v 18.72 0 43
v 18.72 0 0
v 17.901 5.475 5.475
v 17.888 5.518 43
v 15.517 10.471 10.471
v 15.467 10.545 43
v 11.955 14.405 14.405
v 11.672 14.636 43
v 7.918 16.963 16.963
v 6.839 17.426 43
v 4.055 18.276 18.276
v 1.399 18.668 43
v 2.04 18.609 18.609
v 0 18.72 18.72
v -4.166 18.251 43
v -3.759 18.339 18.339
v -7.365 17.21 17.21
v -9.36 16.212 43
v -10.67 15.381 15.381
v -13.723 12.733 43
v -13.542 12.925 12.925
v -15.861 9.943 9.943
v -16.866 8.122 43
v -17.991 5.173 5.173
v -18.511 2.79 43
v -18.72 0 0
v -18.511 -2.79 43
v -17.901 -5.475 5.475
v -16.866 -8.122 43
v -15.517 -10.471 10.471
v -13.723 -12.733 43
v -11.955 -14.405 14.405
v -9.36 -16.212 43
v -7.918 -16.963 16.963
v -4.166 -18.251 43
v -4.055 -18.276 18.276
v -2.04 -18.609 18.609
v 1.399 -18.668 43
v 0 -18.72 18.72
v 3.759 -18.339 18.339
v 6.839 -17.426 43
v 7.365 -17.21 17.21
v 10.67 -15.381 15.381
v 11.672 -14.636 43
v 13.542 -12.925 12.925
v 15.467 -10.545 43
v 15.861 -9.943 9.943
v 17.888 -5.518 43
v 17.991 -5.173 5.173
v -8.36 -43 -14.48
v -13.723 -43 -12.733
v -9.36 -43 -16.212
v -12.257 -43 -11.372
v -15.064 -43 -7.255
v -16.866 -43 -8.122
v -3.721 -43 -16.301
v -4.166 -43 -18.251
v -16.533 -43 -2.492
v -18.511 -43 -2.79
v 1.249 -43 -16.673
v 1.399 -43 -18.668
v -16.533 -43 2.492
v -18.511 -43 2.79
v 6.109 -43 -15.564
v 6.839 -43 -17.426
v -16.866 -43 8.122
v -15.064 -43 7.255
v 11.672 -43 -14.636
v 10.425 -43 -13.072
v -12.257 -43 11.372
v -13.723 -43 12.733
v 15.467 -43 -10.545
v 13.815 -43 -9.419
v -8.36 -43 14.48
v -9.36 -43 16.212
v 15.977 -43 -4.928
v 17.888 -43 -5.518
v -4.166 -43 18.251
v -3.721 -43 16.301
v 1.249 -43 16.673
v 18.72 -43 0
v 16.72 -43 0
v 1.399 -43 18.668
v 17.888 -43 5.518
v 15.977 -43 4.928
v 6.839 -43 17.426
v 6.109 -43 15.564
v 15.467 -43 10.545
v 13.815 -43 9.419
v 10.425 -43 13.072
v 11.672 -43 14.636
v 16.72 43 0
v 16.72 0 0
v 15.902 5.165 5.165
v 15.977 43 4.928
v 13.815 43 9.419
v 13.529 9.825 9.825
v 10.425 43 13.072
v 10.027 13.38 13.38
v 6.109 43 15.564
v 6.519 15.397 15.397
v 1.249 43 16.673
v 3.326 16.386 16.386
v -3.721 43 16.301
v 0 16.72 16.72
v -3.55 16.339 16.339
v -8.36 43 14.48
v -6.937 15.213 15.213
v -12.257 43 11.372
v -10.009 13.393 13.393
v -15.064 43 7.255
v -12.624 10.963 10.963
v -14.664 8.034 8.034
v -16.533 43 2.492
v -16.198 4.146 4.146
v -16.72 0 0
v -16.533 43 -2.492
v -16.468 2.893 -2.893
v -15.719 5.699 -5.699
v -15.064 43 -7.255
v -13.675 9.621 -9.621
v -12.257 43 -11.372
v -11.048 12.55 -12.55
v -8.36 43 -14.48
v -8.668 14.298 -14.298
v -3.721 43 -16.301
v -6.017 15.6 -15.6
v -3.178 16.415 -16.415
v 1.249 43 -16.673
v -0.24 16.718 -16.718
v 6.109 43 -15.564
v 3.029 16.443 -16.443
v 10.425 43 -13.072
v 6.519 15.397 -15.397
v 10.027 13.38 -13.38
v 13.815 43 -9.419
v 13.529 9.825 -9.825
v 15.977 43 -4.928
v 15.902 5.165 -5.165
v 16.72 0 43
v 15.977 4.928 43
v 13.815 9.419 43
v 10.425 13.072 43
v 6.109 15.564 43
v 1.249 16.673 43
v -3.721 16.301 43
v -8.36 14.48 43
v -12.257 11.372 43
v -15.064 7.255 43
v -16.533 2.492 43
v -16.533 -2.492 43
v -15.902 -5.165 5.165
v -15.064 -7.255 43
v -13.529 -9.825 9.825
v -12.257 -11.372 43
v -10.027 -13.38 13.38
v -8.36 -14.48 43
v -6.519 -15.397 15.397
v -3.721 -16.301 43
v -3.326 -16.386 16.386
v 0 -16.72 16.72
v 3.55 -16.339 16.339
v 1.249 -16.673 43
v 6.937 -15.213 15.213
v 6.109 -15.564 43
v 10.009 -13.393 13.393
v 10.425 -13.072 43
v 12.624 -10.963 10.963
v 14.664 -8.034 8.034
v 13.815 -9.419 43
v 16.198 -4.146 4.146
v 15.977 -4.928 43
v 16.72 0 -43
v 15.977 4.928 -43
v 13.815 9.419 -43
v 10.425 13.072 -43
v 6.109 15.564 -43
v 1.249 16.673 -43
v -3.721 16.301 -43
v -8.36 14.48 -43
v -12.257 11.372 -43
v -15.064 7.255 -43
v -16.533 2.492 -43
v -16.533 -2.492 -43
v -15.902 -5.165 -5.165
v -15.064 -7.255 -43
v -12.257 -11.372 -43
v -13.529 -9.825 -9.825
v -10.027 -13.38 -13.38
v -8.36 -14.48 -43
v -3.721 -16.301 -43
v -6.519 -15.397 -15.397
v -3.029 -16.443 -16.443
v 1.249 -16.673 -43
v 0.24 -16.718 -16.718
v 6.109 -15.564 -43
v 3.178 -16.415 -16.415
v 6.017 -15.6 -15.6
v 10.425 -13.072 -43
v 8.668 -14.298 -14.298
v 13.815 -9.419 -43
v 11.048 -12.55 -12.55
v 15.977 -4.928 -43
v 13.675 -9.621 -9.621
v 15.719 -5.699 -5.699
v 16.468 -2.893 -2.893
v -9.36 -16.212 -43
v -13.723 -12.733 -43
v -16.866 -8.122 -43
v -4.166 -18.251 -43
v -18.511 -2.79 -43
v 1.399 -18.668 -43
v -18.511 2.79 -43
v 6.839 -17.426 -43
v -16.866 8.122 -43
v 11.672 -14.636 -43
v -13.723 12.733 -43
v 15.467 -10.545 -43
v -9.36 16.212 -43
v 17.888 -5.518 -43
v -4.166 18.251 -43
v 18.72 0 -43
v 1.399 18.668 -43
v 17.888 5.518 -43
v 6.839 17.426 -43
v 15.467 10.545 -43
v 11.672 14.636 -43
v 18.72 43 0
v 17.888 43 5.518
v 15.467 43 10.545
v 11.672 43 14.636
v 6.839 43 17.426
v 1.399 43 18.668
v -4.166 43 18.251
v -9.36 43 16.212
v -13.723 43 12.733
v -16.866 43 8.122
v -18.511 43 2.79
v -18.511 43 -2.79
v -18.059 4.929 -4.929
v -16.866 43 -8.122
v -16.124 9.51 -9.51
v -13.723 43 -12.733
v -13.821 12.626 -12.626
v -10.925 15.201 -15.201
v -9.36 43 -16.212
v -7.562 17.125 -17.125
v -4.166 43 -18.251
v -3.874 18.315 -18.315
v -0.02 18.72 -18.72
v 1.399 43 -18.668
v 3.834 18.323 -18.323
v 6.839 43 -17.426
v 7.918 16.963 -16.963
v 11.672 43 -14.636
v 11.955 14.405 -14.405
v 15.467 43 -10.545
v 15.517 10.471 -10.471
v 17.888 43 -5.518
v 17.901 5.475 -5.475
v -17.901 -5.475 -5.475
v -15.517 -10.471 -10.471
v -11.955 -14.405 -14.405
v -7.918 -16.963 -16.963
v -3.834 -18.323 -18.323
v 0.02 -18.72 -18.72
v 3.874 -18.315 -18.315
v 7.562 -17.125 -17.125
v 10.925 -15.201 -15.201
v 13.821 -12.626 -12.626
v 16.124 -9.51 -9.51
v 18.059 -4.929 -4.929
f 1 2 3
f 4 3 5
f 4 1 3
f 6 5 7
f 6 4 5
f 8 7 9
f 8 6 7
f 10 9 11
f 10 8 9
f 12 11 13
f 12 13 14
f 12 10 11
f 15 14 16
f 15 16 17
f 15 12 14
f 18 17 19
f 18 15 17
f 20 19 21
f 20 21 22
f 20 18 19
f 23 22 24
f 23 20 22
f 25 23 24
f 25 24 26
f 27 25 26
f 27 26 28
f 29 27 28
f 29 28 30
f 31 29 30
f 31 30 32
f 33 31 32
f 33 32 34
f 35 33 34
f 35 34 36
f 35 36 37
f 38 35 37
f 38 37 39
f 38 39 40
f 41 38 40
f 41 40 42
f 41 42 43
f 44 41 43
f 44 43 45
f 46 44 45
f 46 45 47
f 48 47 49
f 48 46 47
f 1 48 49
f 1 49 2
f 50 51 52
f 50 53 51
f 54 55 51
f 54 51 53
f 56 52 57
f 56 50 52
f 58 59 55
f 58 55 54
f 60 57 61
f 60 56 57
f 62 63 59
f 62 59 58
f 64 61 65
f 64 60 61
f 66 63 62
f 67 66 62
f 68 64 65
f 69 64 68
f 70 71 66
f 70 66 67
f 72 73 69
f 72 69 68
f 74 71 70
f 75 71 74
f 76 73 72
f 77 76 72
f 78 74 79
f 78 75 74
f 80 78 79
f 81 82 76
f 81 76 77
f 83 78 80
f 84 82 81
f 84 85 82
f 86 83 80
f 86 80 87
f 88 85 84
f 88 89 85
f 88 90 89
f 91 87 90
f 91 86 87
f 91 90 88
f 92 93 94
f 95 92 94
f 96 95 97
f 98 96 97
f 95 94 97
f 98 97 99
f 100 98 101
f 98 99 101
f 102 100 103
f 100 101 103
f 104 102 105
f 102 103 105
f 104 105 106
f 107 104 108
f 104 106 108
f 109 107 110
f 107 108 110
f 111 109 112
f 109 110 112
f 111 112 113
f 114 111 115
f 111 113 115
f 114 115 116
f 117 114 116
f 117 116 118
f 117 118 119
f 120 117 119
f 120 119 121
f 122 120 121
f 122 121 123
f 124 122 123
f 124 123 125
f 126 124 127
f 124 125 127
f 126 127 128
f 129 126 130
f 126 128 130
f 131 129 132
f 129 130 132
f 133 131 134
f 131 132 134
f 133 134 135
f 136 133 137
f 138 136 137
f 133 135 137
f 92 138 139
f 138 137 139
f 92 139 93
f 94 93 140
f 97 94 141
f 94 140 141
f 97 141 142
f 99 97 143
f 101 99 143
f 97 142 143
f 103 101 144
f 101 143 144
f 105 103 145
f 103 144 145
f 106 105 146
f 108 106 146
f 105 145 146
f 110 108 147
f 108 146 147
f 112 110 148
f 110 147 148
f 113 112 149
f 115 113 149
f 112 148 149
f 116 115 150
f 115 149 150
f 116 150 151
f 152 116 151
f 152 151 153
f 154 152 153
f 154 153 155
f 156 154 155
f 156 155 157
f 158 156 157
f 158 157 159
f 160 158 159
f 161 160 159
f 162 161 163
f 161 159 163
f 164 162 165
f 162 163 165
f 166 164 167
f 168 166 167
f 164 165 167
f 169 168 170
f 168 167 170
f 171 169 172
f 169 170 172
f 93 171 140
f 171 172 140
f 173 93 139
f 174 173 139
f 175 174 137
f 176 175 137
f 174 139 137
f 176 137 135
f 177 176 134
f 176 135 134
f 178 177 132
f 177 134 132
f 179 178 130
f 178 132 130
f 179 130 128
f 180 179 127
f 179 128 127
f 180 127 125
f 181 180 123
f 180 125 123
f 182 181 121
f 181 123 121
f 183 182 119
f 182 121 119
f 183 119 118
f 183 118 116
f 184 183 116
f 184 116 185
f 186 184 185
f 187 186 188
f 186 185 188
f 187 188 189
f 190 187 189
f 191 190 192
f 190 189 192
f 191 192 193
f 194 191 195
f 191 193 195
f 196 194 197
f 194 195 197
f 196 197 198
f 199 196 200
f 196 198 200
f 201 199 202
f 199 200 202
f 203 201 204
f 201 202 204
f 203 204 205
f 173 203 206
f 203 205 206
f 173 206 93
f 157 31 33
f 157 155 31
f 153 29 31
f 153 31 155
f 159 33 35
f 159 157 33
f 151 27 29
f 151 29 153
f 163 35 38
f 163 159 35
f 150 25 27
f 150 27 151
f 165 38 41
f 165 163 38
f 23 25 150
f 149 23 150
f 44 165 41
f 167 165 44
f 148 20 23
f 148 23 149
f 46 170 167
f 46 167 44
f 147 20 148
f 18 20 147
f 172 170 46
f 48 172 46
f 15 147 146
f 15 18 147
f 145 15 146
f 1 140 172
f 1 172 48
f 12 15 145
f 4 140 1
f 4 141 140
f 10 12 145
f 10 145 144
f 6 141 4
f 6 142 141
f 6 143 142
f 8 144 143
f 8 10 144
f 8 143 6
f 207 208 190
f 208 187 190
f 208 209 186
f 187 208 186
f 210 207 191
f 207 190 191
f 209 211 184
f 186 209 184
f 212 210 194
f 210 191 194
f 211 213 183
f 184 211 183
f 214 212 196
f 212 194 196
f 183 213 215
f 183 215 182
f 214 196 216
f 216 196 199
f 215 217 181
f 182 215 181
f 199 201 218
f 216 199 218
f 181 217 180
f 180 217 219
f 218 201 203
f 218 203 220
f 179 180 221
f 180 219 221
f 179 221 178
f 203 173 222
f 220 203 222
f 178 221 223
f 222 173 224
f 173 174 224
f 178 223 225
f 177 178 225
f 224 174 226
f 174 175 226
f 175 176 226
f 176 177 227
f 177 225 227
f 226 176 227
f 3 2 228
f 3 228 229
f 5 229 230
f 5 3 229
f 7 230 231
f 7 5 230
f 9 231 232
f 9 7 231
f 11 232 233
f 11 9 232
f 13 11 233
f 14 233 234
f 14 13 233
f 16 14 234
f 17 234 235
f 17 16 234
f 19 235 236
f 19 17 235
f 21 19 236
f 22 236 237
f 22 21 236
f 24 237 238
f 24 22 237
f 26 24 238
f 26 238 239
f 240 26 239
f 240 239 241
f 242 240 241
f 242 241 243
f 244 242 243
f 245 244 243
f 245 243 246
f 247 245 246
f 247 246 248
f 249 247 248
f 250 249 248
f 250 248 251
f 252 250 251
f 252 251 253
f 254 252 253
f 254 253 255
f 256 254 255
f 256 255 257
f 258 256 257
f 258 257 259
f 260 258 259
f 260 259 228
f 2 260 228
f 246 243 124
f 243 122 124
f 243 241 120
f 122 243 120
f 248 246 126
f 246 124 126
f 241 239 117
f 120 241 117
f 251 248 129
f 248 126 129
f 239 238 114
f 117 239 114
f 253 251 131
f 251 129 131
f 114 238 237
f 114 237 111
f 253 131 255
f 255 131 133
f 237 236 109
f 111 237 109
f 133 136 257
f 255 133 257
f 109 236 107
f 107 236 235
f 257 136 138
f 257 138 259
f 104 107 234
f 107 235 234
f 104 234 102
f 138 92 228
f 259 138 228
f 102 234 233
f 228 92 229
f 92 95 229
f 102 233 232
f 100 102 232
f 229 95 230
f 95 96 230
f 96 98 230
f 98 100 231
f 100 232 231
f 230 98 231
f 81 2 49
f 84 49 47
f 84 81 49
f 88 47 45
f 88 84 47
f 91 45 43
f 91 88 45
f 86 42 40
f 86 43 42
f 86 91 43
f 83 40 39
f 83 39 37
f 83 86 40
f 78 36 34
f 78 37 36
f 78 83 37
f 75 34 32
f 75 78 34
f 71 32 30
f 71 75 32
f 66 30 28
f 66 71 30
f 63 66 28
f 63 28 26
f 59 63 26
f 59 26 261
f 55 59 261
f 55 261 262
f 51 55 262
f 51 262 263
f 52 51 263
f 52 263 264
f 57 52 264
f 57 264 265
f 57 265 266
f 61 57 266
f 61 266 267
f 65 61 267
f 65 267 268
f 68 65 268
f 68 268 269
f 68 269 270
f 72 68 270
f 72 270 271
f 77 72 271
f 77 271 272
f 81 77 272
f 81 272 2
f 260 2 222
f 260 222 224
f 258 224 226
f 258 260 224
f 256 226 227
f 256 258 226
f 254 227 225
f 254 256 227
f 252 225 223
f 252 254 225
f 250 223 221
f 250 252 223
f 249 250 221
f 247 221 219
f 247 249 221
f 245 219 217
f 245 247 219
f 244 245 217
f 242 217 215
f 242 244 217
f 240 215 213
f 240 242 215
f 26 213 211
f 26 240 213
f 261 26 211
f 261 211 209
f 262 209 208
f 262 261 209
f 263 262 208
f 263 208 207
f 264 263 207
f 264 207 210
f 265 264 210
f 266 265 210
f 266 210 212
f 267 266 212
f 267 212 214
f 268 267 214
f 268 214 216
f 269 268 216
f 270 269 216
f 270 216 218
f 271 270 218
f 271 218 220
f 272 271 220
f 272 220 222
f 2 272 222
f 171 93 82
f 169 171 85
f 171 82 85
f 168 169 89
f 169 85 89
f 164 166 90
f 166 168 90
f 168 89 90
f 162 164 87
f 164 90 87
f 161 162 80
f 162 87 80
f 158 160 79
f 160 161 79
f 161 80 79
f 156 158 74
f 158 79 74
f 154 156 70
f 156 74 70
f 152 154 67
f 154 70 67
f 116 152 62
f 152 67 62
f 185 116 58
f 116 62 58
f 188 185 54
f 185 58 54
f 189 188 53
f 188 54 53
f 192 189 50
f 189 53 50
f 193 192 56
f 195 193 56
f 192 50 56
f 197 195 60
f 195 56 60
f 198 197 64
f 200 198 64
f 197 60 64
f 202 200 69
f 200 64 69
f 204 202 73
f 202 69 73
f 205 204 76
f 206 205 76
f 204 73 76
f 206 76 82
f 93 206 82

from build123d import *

# Parameters (mm, degrees)
F0_R     = 16.72
F1_DEPTH = 43
F2_R     = 16.72
F3_DEPTH = 43
F4_T     = 2


with BuildPart() as f1:
    # F0 (on Top) → F1 (new body, symmetric)
    with BuildSketch(Plane.XY):
        Circle(F0_R)
    extrude(amount=F1_DEPTH, both=True)

    # F2 (on Front) → F3 (join, symmetric)
    with BuildSketch(Plane.XZ):
        Circle(F2_R)
    extrude(amount=F3_DEPTH, both=True)

    # F4
    f4_openings = [f1.faces().sort_by_distance(p)[0] for p in [
        (0, 0, -43),
        (0, -43, 0),
        (0, 0, 43),
        (0, 43, 0),
    ]]
    offset(amount=F4_T, openings=f4_openings)


solid = f1.part
